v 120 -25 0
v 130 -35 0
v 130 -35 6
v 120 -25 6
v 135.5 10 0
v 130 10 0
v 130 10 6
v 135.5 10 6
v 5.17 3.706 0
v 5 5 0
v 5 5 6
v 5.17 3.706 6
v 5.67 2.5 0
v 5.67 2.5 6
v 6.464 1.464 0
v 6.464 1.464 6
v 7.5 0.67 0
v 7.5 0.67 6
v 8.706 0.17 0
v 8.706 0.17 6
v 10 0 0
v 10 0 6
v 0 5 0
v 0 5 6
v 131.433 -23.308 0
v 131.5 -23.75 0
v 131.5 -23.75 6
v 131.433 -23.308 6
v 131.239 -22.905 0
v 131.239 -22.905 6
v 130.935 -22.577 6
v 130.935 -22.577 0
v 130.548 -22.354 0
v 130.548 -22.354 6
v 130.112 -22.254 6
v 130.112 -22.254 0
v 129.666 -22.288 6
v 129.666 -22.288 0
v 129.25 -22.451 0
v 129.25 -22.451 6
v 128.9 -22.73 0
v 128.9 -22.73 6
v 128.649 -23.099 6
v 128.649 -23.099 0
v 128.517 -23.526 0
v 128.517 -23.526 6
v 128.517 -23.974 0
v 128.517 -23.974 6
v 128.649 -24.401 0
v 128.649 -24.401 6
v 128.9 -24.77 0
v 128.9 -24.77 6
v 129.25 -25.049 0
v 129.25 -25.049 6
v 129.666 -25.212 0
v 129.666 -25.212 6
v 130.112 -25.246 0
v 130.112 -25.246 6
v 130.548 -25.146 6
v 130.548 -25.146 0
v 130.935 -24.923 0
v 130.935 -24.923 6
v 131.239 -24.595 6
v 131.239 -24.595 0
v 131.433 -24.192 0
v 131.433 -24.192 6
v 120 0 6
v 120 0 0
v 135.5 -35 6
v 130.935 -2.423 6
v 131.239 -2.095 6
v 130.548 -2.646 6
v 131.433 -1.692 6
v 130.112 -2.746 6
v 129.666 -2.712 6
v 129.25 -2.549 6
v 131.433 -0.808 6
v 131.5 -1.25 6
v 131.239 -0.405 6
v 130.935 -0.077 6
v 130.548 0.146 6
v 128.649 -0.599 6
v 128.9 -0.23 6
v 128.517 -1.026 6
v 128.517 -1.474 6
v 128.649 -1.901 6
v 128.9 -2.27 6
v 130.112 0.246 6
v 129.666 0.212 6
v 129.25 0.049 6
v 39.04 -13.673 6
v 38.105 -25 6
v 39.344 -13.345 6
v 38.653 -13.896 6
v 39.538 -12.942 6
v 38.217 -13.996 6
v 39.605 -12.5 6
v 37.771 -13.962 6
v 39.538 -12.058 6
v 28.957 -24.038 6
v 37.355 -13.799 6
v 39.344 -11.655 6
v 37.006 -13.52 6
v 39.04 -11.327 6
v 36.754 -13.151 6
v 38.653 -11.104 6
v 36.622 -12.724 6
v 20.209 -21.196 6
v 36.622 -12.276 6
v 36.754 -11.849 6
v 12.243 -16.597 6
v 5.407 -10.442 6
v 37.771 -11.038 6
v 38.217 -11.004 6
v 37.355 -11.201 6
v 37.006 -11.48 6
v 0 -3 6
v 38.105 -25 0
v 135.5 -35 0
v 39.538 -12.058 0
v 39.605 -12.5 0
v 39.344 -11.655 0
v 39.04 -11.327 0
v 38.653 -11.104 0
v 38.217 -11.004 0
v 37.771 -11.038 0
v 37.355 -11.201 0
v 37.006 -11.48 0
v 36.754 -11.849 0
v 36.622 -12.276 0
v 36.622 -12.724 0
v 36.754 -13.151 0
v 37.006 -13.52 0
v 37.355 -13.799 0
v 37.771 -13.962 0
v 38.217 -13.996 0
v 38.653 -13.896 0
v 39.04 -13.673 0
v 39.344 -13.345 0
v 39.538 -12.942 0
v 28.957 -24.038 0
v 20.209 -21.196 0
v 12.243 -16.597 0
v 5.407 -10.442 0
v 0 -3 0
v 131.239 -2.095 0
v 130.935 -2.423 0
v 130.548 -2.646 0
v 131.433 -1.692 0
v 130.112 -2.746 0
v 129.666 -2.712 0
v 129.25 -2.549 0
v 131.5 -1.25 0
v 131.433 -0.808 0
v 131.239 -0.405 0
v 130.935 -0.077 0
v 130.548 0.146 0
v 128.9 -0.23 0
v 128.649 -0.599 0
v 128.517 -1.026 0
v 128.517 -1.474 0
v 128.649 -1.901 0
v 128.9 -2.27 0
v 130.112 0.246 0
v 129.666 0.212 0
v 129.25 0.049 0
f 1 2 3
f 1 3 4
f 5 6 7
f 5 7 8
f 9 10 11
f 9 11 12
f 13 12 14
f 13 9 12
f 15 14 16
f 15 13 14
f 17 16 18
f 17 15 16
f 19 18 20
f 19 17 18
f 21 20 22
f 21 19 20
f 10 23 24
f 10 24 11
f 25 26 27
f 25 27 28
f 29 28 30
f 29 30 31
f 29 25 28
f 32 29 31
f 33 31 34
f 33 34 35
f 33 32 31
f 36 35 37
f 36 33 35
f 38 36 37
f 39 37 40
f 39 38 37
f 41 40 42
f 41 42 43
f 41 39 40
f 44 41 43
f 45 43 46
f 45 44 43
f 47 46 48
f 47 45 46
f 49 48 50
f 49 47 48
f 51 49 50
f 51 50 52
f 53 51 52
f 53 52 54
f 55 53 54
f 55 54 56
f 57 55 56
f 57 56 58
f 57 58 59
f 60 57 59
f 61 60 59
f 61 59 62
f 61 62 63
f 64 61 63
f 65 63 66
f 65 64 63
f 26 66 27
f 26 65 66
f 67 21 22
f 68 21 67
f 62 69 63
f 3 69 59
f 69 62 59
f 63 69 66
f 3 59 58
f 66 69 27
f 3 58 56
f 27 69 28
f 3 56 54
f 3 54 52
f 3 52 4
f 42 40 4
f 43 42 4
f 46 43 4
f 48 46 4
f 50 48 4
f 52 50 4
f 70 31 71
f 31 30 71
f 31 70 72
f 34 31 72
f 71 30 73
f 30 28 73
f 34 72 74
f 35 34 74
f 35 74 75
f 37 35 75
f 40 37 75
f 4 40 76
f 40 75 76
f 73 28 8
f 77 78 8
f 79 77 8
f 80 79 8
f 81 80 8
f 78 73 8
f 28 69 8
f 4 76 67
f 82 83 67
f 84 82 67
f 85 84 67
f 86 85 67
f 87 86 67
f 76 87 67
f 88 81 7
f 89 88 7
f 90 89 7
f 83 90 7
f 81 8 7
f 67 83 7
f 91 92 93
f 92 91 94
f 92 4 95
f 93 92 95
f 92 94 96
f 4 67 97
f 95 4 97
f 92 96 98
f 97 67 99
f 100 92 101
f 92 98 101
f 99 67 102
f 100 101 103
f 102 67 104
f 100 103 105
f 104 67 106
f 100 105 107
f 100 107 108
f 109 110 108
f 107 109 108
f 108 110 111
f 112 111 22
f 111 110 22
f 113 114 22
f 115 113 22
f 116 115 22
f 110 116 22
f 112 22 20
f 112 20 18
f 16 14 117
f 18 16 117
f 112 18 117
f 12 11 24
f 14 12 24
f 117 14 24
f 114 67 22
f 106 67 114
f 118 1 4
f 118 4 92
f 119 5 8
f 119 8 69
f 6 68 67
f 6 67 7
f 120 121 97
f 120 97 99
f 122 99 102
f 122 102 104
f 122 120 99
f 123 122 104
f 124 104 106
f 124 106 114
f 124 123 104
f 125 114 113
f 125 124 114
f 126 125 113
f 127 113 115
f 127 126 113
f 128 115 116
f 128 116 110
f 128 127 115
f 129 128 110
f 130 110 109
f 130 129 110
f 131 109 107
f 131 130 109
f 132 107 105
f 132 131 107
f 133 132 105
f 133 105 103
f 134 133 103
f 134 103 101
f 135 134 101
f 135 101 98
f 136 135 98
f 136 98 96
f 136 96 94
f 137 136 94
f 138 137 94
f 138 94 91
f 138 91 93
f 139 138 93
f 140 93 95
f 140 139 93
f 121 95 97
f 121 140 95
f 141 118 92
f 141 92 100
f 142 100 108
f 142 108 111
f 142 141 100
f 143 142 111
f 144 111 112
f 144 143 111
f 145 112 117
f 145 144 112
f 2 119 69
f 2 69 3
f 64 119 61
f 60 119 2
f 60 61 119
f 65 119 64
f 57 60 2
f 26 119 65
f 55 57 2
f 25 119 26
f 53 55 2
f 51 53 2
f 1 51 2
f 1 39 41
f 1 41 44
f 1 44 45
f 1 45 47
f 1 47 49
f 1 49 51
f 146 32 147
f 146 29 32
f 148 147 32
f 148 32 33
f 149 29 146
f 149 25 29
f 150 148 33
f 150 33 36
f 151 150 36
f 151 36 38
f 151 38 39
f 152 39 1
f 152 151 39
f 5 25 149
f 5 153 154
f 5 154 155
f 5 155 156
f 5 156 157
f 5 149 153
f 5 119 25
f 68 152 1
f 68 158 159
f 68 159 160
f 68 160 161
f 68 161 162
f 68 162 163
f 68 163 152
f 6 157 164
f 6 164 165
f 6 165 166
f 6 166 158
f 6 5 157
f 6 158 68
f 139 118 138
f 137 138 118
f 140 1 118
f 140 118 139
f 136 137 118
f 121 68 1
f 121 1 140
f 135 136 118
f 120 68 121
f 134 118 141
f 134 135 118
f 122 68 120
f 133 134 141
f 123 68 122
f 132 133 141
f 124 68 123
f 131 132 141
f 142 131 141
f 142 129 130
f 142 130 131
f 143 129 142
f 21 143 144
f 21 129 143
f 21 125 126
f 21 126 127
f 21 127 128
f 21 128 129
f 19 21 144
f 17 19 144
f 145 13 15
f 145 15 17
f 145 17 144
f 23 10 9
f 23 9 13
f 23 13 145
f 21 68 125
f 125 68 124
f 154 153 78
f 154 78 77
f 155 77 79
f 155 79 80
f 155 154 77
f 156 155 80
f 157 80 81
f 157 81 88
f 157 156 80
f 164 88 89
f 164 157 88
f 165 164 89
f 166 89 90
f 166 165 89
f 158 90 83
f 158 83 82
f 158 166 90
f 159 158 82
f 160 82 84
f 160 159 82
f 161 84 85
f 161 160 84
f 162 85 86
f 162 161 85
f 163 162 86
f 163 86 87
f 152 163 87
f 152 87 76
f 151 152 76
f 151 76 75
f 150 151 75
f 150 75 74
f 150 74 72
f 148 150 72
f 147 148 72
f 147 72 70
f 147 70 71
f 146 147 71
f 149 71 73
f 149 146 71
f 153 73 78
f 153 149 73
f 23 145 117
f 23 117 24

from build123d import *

# Parameters (mm, degrees)
SKETCH1_R           = 1.5
BOSS_EXTRUDE1_DEPTH = 6


with BuildPart() as part:
    # Sketch1 → Boss-Extrude1 (new body)
    with BuildSketch(Plane.XY):
        with BuildLine():
            Line((120, -25), (38.105117767, -25))
            ThreePointArc((38.105117767, -25), (16.105117767, -19.105117767), (0, -3))
            Line((0, -3), (0, 0))
            Line((0, 0), (0, 5))
            Line((0, 5), (5, 5))
            ThreePointArc((5, 5), (6.464466094, 1.464466094), (10, 0))
            Line((10, 0), (120, 0))
            Line((120, 0), (130, 10))
            Line((130, 10), (135.5, 10))
            Line((135.5, 10), (135.5, -35))
            Line((135.5, -35), (130, -35))
            Line((130, -35), (120, -25))
        make_face()
        with Locations((130, -1.25)):
            Circle(SKETCH1_R, mode=Mode.SUBTRACT)
        with Locations((130, -23.75)):
            Circle(SKETCH1_R, mode=Mode.SUBTRACT)
        with Locations((38.105117767, -12.5)):
            Circle(SKETCH1_R, mode=Mode.SUBTRACT)
    extrude(amount=BOSS_EXTRUDE1_DEPTH)


solid = part.part
